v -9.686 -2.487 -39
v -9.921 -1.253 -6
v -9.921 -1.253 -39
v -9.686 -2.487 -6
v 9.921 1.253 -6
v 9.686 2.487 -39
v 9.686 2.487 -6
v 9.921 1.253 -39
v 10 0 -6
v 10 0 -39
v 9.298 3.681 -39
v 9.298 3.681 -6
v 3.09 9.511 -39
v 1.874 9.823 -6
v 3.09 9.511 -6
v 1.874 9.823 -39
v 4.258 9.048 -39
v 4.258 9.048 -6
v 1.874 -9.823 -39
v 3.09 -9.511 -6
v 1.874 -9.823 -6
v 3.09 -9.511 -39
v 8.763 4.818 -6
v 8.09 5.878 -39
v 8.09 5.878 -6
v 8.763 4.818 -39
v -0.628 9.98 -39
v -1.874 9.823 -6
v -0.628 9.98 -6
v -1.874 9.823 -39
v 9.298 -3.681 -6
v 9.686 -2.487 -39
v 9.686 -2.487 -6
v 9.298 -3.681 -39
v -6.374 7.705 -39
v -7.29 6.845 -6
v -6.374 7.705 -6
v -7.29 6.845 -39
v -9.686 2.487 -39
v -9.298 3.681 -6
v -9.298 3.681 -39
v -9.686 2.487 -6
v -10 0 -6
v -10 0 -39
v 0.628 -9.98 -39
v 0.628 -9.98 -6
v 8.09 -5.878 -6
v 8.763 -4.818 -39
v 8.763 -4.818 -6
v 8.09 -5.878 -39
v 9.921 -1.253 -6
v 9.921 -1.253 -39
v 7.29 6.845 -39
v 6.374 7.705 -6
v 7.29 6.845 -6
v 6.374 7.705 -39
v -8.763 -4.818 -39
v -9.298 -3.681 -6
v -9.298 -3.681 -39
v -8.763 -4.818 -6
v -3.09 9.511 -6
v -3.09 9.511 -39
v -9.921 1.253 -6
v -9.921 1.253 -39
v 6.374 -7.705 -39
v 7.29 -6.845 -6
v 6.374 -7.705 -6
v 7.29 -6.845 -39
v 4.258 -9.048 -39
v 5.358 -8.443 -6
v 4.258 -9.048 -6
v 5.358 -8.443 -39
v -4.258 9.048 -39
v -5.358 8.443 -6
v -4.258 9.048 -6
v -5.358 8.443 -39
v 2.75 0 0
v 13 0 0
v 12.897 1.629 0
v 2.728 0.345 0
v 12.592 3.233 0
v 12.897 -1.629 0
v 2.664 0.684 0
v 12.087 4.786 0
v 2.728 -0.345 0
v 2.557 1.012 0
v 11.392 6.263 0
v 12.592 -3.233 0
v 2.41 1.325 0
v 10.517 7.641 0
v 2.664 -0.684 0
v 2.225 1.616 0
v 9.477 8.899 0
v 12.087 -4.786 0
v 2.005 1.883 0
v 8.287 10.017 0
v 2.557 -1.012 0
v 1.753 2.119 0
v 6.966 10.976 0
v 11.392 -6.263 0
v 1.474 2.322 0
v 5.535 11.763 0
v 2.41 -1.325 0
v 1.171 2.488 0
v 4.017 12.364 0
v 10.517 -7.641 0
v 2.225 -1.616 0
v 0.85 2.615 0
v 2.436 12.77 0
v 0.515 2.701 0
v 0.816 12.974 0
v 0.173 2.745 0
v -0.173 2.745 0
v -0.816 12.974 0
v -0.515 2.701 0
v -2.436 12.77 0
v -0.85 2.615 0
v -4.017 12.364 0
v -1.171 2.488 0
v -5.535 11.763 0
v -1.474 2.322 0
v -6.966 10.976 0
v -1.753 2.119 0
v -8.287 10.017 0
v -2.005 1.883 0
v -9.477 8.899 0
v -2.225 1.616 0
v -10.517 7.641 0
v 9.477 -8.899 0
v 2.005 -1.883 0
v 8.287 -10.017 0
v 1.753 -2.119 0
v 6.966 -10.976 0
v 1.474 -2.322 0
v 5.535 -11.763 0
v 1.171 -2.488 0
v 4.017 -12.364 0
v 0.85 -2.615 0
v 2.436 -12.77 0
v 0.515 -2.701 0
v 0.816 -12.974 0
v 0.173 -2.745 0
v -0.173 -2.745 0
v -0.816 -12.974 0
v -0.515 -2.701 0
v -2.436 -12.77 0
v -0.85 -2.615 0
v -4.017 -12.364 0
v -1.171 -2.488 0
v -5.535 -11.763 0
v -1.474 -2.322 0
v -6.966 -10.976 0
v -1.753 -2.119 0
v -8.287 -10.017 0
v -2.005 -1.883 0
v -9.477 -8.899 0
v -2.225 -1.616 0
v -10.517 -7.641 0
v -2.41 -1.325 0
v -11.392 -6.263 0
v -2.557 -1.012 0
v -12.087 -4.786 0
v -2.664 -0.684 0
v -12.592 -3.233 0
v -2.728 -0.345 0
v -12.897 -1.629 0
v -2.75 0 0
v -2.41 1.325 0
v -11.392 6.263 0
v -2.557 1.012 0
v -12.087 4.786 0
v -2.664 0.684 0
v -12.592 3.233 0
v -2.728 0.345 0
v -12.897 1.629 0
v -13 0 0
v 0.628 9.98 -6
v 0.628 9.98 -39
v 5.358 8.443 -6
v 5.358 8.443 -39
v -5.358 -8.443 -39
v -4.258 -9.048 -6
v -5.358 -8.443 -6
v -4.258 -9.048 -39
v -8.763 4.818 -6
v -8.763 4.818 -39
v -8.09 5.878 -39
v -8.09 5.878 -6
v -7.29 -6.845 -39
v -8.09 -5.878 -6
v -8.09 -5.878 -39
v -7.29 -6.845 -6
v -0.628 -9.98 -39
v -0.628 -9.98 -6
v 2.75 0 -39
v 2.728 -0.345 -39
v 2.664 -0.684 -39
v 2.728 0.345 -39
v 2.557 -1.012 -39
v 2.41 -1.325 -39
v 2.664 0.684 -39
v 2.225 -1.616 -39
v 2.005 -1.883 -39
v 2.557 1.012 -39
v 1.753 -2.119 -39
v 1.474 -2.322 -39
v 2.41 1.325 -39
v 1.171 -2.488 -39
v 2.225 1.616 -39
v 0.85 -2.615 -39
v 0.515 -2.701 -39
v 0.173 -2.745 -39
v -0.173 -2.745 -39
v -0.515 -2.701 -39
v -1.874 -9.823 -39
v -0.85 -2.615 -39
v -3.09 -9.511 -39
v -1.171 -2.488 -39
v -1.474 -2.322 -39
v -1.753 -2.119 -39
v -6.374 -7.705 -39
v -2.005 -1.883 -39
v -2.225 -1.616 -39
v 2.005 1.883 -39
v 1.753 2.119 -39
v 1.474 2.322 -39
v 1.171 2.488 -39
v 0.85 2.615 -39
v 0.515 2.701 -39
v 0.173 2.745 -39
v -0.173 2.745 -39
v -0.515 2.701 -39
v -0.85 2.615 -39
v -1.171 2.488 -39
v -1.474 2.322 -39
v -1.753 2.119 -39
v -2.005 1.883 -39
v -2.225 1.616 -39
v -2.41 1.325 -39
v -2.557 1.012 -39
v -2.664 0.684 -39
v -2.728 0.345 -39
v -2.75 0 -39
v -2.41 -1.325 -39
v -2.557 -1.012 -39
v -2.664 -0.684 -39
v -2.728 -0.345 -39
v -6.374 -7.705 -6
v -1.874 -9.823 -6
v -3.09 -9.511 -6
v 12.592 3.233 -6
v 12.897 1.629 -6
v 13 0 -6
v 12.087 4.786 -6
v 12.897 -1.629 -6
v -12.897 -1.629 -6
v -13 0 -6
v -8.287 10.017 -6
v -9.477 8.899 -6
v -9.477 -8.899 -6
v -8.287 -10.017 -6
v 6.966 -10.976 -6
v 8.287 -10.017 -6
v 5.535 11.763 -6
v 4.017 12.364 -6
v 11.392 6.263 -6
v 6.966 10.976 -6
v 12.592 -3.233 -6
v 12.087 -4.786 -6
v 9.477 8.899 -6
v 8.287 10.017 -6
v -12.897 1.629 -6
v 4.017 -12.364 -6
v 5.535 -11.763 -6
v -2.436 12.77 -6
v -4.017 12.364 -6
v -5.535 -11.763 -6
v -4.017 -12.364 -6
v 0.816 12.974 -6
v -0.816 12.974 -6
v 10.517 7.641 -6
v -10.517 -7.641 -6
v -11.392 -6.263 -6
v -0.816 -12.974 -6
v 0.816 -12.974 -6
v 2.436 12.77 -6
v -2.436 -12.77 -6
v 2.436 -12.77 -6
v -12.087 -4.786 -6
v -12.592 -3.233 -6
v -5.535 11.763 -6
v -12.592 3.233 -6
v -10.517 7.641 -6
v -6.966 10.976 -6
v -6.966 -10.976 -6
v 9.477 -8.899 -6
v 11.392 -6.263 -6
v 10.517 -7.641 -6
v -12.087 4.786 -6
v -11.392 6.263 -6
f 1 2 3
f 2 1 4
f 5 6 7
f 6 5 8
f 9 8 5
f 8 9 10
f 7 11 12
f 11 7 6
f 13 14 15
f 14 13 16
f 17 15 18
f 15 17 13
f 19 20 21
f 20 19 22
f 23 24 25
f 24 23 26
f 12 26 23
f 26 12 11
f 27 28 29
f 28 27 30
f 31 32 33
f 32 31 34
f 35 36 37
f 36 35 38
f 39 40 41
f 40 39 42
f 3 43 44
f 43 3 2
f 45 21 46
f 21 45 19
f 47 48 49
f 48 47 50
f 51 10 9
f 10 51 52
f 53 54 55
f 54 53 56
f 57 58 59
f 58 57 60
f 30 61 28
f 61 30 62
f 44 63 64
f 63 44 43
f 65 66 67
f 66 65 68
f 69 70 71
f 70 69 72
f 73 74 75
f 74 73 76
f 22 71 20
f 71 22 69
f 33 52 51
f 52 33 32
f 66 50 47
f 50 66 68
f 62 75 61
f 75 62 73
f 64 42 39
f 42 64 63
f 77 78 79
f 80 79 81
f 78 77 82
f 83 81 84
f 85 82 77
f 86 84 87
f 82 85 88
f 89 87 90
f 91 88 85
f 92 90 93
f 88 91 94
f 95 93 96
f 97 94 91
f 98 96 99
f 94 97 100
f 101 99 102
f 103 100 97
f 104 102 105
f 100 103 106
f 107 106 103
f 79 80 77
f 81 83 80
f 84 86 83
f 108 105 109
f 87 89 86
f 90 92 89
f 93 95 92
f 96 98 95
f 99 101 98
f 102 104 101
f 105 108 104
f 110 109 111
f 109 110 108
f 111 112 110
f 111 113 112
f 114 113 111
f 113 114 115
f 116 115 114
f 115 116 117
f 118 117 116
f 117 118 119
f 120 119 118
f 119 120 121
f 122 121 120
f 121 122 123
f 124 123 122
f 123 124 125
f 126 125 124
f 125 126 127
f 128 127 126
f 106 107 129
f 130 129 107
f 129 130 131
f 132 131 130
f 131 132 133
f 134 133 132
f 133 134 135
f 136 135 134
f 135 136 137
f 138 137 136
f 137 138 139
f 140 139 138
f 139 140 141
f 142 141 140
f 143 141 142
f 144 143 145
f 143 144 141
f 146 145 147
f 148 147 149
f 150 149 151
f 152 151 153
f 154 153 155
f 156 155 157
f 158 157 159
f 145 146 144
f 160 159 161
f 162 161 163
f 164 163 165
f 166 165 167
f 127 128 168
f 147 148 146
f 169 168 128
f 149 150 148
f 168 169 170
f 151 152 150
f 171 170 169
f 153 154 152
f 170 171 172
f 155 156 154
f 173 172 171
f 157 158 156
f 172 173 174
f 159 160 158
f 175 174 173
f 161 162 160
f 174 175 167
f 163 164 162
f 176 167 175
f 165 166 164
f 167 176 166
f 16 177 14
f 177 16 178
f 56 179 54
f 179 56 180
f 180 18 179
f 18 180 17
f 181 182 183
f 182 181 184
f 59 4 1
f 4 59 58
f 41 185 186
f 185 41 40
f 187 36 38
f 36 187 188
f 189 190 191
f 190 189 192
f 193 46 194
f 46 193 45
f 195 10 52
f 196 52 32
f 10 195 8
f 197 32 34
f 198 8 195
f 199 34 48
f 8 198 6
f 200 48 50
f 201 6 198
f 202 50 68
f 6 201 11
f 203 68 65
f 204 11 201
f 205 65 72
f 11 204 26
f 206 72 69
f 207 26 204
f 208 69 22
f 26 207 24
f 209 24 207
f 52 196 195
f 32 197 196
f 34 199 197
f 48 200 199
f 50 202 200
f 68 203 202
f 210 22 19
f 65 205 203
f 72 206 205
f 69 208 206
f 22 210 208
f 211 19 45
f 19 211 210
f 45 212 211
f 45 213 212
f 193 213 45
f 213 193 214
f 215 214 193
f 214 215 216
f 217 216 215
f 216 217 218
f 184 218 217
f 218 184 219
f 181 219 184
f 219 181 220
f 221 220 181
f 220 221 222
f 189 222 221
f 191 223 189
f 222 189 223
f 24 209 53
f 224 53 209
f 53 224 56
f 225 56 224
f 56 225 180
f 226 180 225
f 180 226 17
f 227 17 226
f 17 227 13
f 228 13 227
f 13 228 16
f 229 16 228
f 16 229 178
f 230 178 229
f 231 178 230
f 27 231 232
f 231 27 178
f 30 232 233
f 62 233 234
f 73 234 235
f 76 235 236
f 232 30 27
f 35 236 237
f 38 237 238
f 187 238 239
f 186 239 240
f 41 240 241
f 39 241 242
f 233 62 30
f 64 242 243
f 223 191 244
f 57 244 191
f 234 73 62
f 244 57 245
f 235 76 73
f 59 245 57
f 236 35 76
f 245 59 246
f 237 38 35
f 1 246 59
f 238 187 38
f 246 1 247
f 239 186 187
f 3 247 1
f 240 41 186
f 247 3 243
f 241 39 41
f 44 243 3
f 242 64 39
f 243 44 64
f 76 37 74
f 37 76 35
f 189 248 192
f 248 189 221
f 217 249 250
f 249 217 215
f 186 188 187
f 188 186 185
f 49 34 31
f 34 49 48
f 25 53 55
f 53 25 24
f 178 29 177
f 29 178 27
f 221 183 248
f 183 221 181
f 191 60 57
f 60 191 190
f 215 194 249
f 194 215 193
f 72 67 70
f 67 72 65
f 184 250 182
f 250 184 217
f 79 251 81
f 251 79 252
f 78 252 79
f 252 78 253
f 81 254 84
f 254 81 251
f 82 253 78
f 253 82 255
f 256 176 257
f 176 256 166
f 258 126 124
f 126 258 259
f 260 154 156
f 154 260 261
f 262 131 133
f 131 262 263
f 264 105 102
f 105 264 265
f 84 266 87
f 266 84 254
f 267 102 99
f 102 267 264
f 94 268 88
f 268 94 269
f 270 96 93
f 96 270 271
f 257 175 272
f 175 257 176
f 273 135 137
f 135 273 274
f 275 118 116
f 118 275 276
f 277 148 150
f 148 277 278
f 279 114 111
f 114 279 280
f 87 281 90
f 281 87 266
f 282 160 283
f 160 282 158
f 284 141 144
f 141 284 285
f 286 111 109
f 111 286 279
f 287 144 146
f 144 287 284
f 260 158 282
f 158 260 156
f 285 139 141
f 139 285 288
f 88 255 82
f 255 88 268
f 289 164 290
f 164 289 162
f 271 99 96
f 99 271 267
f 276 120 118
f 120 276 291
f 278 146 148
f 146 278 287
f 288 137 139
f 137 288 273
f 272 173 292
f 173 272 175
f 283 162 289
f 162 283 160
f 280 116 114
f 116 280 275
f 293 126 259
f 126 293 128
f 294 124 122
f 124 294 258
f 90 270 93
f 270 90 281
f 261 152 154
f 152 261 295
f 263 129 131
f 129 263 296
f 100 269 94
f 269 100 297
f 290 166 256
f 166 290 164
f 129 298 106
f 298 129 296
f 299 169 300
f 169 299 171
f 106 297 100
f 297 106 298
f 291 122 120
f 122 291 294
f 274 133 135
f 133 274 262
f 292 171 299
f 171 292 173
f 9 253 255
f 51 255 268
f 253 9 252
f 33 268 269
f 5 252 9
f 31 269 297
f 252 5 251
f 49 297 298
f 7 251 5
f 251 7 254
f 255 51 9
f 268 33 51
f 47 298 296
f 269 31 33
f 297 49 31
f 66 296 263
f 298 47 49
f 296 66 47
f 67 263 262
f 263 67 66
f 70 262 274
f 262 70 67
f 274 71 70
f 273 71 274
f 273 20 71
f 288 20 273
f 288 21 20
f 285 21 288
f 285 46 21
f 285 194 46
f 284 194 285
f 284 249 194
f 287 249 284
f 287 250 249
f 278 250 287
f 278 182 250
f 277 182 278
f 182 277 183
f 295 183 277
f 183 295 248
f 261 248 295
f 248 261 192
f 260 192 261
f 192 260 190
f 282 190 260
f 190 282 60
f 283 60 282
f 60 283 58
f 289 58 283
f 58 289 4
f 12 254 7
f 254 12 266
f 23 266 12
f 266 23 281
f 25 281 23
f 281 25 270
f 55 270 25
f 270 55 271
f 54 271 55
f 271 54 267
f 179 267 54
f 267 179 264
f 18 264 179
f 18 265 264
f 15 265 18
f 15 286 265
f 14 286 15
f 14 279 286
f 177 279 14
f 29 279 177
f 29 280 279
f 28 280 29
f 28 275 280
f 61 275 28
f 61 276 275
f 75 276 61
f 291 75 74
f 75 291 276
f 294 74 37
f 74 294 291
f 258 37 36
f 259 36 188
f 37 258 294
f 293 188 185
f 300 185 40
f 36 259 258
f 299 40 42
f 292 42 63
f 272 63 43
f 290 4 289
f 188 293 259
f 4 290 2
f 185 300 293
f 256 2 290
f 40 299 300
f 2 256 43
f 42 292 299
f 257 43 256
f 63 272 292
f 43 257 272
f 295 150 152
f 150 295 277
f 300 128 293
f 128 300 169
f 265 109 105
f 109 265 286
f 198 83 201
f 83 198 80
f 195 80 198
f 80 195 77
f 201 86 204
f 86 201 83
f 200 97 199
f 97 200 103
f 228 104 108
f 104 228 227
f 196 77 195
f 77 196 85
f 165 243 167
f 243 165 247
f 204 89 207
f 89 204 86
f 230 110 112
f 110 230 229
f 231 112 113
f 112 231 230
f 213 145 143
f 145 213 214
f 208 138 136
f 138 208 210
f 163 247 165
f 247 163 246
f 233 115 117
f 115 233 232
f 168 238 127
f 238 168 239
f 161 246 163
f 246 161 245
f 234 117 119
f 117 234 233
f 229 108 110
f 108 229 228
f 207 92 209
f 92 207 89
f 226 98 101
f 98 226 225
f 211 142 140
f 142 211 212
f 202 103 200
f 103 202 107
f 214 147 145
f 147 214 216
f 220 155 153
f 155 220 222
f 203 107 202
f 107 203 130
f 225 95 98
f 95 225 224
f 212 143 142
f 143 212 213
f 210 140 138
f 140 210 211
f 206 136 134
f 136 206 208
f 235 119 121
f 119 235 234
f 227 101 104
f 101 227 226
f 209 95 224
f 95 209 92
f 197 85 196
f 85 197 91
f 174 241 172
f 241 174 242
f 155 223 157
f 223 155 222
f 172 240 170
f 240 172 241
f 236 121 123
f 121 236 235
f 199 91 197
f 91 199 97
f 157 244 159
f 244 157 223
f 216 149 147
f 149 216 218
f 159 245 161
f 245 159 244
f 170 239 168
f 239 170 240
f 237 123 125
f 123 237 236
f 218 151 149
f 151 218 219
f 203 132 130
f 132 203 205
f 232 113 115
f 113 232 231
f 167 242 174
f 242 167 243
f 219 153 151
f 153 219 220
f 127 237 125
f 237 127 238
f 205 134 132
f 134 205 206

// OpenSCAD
$fn = 50;


difference() {
	union() {
		translate(v = [0, 0, -39.0000000000]) {
			cylinder(h = 39, r = 10.0000000000);
		}
		translate(v = [0, 0, -6.0000000000]) {
			cylinder(h = 6, r = 13.0000000000);
		}
	}
	union() {
		#translate(v = [0, 0, -39]) {
			cylinder(h = 39, r = 2.7500000000);
		}
	}
}
